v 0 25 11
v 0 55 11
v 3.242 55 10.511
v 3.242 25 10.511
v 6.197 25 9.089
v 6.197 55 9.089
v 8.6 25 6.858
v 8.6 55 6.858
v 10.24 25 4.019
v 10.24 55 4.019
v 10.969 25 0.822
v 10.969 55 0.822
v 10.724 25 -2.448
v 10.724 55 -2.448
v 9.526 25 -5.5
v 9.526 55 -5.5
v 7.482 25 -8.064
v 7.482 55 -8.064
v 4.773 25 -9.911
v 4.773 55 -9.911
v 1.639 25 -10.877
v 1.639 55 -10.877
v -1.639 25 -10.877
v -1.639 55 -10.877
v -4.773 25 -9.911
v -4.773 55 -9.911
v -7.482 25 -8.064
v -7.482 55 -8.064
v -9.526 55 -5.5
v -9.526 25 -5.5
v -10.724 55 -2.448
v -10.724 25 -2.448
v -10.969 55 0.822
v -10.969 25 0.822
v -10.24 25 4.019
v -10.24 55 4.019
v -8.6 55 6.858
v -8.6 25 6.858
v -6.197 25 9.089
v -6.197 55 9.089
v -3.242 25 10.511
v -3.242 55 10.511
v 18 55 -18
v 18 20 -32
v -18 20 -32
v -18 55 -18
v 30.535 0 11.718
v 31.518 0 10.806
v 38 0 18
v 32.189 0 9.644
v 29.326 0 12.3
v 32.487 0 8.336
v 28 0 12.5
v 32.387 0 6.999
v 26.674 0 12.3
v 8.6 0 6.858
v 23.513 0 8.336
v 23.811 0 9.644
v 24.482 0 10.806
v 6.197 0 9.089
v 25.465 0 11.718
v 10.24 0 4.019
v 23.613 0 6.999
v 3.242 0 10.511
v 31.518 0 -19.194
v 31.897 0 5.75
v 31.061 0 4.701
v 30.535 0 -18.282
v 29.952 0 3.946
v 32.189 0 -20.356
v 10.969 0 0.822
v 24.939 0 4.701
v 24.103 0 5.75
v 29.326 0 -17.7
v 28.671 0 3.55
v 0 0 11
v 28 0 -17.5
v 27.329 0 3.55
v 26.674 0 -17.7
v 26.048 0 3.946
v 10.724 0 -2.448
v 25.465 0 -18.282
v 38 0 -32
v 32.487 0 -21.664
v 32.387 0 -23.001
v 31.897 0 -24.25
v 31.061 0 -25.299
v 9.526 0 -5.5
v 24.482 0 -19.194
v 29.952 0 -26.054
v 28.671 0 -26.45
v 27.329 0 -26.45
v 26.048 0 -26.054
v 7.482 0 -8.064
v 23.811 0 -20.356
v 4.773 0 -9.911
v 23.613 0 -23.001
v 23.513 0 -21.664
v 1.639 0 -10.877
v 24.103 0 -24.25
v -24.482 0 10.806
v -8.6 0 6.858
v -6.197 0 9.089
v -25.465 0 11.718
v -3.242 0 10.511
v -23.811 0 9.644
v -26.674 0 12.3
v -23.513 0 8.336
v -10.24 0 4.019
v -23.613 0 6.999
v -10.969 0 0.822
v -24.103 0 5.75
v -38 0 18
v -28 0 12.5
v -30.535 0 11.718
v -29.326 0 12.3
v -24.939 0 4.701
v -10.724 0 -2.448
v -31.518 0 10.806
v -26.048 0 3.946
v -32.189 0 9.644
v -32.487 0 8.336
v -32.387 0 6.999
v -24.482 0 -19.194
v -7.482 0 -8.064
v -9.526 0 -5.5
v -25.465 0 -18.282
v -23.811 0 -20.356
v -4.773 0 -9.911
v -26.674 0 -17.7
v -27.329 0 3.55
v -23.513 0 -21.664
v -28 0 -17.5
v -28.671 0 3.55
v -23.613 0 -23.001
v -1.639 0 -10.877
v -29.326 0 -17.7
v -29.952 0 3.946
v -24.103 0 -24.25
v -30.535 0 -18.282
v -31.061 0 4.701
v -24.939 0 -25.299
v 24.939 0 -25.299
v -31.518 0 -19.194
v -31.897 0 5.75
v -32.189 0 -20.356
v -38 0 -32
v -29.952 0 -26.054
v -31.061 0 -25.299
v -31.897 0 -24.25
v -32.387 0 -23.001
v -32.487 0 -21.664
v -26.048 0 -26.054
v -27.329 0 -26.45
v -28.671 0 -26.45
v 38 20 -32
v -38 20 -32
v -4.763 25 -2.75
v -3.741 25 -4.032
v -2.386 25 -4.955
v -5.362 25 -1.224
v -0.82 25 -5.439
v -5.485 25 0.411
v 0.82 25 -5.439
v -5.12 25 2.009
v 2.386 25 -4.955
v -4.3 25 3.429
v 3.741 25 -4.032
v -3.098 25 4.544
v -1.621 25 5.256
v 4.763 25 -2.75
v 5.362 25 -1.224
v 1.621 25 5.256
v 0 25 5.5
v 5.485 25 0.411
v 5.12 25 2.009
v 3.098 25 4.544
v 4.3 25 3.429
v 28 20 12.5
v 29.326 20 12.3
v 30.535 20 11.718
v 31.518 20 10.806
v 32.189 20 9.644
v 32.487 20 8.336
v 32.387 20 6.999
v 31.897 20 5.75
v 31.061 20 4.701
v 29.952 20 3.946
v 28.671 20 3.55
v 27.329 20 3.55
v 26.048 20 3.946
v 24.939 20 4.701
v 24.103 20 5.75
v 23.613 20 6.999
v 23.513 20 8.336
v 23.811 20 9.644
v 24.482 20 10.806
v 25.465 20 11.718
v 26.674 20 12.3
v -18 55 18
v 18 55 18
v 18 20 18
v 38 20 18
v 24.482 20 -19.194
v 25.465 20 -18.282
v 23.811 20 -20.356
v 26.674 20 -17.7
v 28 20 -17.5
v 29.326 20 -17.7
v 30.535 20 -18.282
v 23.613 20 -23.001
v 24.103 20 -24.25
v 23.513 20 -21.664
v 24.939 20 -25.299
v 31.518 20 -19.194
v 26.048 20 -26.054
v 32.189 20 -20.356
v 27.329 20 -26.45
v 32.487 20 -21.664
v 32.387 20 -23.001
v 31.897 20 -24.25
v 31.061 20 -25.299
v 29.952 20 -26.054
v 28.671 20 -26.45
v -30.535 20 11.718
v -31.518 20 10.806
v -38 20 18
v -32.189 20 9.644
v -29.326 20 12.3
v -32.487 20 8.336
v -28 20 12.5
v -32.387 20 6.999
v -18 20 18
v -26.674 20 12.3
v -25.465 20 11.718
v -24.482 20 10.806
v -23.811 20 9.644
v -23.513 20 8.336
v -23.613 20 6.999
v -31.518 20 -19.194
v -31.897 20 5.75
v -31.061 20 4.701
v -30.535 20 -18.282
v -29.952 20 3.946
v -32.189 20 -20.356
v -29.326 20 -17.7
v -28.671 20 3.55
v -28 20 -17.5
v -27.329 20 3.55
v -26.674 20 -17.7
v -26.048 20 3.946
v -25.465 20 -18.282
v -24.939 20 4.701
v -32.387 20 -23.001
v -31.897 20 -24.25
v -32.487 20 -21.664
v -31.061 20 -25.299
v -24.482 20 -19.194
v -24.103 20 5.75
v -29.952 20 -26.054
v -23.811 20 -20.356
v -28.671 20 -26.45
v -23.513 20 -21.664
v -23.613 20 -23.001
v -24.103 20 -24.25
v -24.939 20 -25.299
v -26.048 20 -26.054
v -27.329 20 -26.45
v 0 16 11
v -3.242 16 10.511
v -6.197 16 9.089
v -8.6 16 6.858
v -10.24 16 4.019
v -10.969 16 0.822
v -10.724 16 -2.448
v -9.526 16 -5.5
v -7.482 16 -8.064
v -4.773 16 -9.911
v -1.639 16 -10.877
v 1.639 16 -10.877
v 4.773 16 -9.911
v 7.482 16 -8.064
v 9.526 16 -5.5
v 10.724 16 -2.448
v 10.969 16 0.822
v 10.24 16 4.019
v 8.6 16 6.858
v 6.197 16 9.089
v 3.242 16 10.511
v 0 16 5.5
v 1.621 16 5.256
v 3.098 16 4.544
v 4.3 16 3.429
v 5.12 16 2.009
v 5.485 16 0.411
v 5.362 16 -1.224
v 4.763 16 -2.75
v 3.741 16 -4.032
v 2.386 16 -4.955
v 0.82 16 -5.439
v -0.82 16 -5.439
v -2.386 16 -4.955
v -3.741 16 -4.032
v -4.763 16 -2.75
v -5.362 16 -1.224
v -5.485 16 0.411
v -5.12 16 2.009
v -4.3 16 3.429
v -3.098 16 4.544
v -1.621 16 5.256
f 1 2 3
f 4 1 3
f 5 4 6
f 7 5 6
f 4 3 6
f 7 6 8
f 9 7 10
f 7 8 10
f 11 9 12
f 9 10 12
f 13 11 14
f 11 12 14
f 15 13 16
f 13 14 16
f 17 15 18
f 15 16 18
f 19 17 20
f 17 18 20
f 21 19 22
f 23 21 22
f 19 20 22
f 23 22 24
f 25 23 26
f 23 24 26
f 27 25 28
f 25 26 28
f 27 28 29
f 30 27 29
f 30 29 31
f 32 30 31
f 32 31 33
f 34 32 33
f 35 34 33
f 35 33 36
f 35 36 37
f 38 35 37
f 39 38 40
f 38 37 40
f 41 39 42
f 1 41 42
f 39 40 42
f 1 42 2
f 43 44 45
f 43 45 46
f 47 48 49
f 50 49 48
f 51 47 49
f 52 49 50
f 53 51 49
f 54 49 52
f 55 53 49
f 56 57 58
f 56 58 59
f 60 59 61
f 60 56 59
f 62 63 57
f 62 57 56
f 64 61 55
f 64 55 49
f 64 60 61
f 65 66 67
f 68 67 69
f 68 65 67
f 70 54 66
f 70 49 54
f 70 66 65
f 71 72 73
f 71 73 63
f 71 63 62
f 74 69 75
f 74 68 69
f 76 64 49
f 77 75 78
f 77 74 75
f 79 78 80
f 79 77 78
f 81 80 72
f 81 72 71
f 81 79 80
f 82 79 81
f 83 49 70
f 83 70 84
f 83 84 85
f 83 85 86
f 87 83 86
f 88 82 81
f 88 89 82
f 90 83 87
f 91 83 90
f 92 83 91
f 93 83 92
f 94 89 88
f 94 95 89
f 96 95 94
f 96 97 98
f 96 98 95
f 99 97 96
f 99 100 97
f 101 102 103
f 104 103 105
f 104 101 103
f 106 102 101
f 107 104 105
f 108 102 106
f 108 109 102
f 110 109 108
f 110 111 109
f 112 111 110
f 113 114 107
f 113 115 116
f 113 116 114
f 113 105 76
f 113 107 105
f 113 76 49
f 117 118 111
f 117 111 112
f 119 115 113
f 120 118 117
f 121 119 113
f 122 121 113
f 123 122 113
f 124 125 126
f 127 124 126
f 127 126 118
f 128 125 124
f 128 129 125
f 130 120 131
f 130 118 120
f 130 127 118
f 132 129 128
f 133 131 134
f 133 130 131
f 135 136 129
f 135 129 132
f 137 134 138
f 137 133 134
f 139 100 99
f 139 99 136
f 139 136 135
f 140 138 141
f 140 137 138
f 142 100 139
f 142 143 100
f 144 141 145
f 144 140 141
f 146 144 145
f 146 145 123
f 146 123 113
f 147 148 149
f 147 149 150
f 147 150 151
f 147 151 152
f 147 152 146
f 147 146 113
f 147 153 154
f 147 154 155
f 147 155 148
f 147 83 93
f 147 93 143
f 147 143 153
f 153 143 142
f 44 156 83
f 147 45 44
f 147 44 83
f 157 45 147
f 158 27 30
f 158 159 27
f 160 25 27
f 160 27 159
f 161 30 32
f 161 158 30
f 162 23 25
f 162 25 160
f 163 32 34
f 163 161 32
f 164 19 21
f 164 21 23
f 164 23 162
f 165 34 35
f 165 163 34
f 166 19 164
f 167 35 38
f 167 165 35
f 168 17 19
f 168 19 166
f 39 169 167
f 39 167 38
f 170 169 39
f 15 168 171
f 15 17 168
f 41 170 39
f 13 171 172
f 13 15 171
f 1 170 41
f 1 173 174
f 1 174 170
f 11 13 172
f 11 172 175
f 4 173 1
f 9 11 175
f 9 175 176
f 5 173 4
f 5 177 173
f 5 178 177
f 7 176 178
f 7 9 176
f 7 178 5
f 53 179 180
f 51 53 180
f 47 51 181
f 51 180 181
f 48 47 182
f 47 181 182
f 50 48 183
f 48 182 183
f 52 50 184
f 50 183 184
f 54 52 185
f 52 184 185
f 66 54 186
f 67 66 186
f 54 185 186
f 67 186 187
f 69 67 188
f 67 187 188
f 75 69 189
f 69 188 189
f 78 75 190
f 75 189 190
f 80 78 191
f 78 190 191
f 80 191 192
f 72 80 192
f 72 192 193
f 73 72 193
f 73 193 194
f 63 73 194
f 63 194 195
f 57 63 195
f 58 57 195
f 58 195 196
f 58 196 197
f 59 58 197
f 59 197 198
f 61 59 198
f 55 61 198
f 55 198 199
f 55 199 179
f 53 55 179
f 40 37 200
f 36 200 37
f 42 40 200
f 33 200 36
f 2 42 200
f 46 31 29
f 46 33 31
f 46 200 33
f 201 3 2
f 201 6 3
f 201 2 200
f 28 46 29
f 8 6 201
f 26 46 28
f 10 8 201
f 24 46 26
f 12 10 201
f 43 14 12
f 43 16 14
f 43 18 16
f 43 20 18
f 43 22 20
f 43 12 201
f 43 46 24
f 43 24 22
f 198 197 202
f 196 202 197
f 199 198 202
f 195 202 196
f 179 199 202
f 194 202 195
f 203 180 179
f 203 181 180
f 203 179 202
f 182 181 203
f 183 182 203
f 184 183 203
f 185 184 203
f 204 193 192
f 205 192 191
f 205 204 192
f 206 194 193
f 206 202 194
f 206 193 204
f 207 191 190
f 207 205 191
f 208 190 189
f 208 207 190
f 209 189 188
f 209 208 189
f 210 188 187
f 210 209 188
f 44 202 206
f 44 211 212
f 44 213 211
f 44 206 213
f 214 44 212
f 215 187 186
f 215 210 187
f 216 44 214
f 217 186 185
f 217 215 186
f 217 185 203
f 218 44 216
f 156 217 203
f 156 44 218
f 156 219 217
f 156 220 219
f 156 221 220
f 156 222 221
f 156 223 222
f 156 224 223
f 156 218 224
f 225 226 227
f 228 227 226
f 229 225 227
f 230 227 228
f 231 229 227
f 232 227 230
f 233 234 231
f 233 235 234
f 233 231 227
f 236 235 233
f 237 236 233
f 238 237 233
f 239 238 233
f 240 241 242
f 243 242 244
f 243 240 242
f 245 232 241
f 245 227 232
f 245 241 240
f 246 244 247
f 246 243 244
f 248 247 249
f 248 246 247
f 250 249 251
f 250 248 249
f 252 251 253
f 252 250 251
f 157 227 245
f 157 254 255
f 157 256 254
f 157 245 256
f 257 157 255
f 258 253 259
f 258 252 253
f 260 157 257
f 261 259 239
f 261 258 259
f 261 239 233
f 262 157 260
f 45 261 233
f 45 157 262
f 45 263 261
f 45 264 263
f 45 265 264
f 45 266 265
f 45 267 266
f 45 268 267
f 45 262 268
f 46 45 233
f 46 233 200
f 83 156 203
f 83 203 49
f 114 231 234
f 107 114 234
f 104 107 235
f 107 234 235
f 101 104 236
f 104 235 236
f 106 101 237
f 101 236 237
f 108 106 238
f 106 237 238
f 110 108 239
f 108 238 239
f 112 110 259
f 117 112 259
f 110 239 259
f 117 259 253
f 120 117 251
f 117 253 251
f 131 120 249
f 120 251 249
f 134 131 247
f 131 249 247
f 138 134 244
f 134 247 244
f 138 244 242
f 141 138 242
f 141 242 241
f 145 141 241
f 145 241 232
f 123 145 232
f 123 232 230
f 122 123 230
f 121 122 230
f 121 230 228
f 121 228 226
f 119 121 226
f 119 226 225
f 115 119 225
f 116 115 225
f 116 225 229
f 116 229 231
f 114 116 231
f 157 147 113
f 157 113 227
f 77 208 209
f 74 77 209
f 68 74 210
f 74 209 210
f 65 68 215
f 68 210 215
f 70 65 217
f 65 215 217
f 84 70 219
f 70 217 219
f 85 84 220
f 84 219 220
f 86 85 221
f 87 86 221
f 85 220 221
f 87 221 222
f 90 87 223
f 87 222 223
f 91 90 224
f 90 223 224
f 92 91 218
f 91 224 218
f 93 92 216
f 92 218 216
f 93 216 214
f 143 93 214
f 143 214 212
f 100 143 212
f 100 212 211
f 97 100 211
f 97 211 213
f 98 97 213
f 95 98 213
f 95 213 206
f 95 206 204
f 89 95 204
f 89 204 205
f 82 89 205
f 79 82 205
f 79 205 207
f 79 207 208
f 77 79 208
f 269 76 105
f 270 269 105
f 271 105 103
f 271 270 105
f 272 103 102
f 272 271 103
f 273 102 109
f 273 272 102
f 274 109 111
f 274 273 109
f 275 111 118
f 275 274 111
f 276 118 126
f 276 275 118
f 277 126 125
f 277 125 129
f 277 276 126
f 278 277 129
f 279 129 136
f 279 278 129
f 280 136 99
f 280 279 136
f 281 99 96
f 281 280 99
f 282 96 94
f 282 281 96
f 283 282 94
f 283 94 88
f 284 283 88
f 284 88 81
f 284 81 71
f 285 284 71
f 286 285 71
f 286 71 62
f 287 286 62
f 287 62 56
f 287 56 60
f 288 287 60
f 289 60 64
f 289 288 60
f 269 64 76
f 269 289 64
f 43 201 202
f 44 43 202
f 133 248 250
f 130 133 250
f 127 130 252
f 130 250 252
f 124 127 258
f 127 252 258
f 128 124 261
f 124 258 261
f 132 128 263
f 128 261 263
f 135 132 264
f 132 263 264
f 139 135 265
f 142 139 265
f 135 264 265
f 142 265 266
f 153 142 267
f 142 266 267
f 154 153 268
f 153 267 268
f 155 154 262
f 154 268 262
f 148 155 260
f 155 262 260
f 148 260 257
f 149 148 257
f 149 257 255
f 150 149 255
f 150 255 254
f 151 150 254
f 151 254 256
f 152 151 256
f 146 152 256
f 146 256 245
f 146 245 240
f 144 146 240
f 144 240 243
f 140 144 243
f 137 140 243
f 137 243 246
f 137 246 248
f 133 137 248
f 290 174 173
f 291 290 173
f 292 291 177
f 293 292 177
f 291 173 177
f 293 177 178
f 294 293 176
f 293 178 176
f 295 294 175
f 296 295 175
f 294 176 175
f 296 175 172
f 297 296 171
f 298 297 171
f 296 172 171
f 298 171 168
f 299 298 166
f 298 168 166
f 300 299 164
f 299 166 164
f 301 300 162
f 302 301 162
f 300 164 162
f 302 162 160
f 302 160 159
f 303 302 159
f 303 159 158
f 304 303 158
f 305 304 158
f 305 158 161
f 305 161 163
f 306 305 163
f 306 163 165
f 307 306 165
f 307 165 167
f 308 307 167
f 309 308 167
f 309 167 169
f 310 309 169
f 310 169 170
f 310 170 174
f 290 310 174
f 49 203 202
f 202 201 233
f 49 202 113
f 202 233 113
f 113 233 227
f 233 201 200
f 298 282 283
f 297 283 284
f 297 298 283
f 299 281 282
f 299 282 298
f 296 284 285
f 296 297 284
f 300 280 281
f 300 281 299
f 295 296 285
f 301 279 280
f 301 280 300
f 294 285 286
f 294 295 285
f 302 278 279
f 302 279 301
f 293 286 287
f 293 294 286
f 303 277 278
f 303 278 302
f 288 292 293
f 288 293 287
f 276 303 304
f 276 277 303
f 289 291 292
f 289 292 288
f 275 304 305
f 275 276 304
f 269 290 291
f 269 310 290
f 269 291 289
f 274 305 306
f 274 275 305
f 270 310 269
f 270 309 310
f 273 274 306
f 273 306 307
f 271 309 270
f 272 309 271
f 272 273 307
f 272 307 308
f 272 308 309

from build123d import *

# Parameters (mm, degrees)
SALIENTE_EXTRUIR1_DEPTH      = 18
SALIENTE_EXTRUIR1_DEPTH_BACK = 32
CROQUIS2_R                   = 11
CORTAR_EXTRUIR1_DEPTH        = 30
CORTAR_EXTRUIR2_START        = -16
CROQUIS3_R                   = 11
CORTAR_EXTRUIR2_DEPTH        = 16
CORTAR_EXTRUIR3_REACH        = 60.034
CROQUIS4_R                   = 5.5
CORTAR_EXTRUIR4_REACH        = 86.764
CORTAR_EXTRUIR5_REACH        = 62.77
CROQUIS6_R                   = 4.5


with BuildPart() as part:
    # Croquis1 → Saliente-Extruir1 (new, two sides: drawn at the far end of the back side and taken through both)
    with BuildSketch(Plane.XY.offset(-SALIENTE_EXTRUIR1_DEPTH_BACK)):
        Polygon((38, 0), (-38, 0), (-38, 20), (-18, 20), (-18, 55), (18, 55), (18, 20), (38, 20), align=None)
    extrude(amount=SALIENTE_EXTRUIR1_DEPTH + SALIENTE_EXTRUIR1_DEPTH_BACK)

    # Croquis2 → Cortar-Extruir1 (cut)
    with BuildSketch(Plane(origin=(0, 55, 0), x_dir=(1, 0, 0), z_dir=(0, 1, 0))):
        with Locations(Location((0, 0, 0), (0, 0, 270))):
            Circle(CROQUIS2_R)
    extrude(amount=-CORTAR_EXTRUIR1_DEPTH, mode=Mode.SUBTRACT)

    # Croquis3 → Cortar-Extruir2 (cut)
    with BuildSketch(Plane.XZ.offset(CORTAR_EXTRUIR2_START)):
        with Locations(Location((0, 0, 0), (0, 0, 90))):
            Circle(CROQUIS3_R)
    extrude(amount=CORTAR_EXTRUIR2_DEPTH, mode=Mode.SUBTRACT)

    # Croquis4 → Cortar-Extruir3 (cut, up to next)
    with BuildSketch(Plane(origin=(0, 25, 0), x_dir=(1, 0, 0), z_dir=(0, 1, 0)), mode=Mode.PRIVATE) as cortar_extruir3_sk1:
        with Locations(Location((0, 0, 0), (0, 0, 270))):
            Circle(CROQUIS4_R)
    cortar_extruir3_tool1 = extrude(cortar_extruir3_sk1.sketch, amount=-CORTAR_EXTRUIR3_REACH, mode=Mode.PRIVATE) & part.part
    add(cortar_extruir3_tool1.solids().sort_by_distance((0, 25, 0))[0], mode=Mode.SUBTRACT)

    # Croquis5 → Cortar-Extruir4 (cut, up to next)
    with BuildSketch(Plane(origin=(18, 0, 0), x_dir=(0, 0, -1), z_dir=(1, 0, 0)), mode=Mode.PRIVATE) as cortar_extruir4_sk1:
        Polygon((32, 55), (32, 20), (18, 55), align=None)
    cortar_extruir4_tool1 = extrude(cortar_extruir4_sk1.sketch, amount=-CORTAR_EXTRUIR4_REACH, mode=Mode.PRIVATE) & part.part
    add(cortar_extruir4_tool1.solids().sort_by_distance((18, 43.333333, -27.333333))[0], mode=Mode.SUBTRACT)

    # Croquis6 → Cortar-Extruir5 (cut, up to next)
    with BuildSketch(Plane(origin=(0, 20, 0), x_dir=(1, 0, 0), z_dir=(0, 1, 0)), mode=Mode.PRIVATE) as cortar_extruir5_sk1:
        with Locations(Location((-28, 22, 0), (0, 0, 270))):
            Circle(CROQUIS6_R)
    cortar_extruir5_tool1 = extrude(cortar_extruir5_sk1.sketch, amount=-CORTAR_EXTRUIR5_REACH, mode=Mode.PRIVATE) & part.part
    # Croquis6 → Cortar-Extruir5 (cut, up to next)
    with BuildSketch(Plane(origin=(0, 20, 0), x_dir=(1, 0, 0), z_dir=(0, 1, 0)), mode=Mode.PRIVATE) as cortar_extruir5_sk2:
        with Locations(Location((-28, -8, 0), (0, 0, 270))):
            Circle(CROQUIS6_R)
    cortar_extruir5_tool2 = extrude(cortar_extruir5_sk2.sketch, amount=-CORTAR_EXTRUIR5_REACH, mode=Mode.PRIVATE) & part.part
    # Croquis6 → Cortar-Extruir5 (cut, up to next)
    with BuildSketch(Plane(origin=(0, 20, 0), x_dir=(1, 0, 0), z_dir=(0, 1, 0)), mode=Mode.PRIVATE) as cortar_extruir5_sk3:
        with Locations(Location((28, 22, 0), (0, 0, 270))):
            Circle(CROQUIS6_R)
    cortar_extruir5_tool3 = extrude(cortar_extruir5_sk3.sketch, amount=-CORTAR_EXTRUIR5_REACH, mode=Mode.PRIVATE) & part.part
    # Croquis6 → Cortar-Extruir5 (cut, up to next)
    with BuildSketch(Plane(origin=(0, 20, 0), x_dir=(1, 0, 0), z_dir=(0, 1, 0)), mode=Mode.PRIVATE) as cortar_extruir5_sk4:
        with Locations(Location((28, -8, 0), (0, 0, 270))):
            Circle(CROQUIS6_R)
    cortar_extruir5_tool4 = extrude(cortar_extruir5_sk4.sketch, amount=-CORTAR_EXTRUIR5_REACH, mode=Mode.PRIVATE) & part.part
    add(cortar_extruir5_tool1.solids().sort_by_distance((-28, 20, -22))[0], mode=Mode.SUBTRACT)
    add(cortar_extruir5_tool2.solids().sort_by_distance((-28, 20, 8))[0], mode=Mode.SUBTRACT)
    add(cortar_extruir5_tool3.solids().sort_by_distance((28, 20, -22))[0], mode=Mode.SUBTRACT)
    add(cortar_extruir5_tool4.solids().sort_by_distance((28, 20, 8))[0], mode=Mode.SUBTRACT)


solid = part.part
